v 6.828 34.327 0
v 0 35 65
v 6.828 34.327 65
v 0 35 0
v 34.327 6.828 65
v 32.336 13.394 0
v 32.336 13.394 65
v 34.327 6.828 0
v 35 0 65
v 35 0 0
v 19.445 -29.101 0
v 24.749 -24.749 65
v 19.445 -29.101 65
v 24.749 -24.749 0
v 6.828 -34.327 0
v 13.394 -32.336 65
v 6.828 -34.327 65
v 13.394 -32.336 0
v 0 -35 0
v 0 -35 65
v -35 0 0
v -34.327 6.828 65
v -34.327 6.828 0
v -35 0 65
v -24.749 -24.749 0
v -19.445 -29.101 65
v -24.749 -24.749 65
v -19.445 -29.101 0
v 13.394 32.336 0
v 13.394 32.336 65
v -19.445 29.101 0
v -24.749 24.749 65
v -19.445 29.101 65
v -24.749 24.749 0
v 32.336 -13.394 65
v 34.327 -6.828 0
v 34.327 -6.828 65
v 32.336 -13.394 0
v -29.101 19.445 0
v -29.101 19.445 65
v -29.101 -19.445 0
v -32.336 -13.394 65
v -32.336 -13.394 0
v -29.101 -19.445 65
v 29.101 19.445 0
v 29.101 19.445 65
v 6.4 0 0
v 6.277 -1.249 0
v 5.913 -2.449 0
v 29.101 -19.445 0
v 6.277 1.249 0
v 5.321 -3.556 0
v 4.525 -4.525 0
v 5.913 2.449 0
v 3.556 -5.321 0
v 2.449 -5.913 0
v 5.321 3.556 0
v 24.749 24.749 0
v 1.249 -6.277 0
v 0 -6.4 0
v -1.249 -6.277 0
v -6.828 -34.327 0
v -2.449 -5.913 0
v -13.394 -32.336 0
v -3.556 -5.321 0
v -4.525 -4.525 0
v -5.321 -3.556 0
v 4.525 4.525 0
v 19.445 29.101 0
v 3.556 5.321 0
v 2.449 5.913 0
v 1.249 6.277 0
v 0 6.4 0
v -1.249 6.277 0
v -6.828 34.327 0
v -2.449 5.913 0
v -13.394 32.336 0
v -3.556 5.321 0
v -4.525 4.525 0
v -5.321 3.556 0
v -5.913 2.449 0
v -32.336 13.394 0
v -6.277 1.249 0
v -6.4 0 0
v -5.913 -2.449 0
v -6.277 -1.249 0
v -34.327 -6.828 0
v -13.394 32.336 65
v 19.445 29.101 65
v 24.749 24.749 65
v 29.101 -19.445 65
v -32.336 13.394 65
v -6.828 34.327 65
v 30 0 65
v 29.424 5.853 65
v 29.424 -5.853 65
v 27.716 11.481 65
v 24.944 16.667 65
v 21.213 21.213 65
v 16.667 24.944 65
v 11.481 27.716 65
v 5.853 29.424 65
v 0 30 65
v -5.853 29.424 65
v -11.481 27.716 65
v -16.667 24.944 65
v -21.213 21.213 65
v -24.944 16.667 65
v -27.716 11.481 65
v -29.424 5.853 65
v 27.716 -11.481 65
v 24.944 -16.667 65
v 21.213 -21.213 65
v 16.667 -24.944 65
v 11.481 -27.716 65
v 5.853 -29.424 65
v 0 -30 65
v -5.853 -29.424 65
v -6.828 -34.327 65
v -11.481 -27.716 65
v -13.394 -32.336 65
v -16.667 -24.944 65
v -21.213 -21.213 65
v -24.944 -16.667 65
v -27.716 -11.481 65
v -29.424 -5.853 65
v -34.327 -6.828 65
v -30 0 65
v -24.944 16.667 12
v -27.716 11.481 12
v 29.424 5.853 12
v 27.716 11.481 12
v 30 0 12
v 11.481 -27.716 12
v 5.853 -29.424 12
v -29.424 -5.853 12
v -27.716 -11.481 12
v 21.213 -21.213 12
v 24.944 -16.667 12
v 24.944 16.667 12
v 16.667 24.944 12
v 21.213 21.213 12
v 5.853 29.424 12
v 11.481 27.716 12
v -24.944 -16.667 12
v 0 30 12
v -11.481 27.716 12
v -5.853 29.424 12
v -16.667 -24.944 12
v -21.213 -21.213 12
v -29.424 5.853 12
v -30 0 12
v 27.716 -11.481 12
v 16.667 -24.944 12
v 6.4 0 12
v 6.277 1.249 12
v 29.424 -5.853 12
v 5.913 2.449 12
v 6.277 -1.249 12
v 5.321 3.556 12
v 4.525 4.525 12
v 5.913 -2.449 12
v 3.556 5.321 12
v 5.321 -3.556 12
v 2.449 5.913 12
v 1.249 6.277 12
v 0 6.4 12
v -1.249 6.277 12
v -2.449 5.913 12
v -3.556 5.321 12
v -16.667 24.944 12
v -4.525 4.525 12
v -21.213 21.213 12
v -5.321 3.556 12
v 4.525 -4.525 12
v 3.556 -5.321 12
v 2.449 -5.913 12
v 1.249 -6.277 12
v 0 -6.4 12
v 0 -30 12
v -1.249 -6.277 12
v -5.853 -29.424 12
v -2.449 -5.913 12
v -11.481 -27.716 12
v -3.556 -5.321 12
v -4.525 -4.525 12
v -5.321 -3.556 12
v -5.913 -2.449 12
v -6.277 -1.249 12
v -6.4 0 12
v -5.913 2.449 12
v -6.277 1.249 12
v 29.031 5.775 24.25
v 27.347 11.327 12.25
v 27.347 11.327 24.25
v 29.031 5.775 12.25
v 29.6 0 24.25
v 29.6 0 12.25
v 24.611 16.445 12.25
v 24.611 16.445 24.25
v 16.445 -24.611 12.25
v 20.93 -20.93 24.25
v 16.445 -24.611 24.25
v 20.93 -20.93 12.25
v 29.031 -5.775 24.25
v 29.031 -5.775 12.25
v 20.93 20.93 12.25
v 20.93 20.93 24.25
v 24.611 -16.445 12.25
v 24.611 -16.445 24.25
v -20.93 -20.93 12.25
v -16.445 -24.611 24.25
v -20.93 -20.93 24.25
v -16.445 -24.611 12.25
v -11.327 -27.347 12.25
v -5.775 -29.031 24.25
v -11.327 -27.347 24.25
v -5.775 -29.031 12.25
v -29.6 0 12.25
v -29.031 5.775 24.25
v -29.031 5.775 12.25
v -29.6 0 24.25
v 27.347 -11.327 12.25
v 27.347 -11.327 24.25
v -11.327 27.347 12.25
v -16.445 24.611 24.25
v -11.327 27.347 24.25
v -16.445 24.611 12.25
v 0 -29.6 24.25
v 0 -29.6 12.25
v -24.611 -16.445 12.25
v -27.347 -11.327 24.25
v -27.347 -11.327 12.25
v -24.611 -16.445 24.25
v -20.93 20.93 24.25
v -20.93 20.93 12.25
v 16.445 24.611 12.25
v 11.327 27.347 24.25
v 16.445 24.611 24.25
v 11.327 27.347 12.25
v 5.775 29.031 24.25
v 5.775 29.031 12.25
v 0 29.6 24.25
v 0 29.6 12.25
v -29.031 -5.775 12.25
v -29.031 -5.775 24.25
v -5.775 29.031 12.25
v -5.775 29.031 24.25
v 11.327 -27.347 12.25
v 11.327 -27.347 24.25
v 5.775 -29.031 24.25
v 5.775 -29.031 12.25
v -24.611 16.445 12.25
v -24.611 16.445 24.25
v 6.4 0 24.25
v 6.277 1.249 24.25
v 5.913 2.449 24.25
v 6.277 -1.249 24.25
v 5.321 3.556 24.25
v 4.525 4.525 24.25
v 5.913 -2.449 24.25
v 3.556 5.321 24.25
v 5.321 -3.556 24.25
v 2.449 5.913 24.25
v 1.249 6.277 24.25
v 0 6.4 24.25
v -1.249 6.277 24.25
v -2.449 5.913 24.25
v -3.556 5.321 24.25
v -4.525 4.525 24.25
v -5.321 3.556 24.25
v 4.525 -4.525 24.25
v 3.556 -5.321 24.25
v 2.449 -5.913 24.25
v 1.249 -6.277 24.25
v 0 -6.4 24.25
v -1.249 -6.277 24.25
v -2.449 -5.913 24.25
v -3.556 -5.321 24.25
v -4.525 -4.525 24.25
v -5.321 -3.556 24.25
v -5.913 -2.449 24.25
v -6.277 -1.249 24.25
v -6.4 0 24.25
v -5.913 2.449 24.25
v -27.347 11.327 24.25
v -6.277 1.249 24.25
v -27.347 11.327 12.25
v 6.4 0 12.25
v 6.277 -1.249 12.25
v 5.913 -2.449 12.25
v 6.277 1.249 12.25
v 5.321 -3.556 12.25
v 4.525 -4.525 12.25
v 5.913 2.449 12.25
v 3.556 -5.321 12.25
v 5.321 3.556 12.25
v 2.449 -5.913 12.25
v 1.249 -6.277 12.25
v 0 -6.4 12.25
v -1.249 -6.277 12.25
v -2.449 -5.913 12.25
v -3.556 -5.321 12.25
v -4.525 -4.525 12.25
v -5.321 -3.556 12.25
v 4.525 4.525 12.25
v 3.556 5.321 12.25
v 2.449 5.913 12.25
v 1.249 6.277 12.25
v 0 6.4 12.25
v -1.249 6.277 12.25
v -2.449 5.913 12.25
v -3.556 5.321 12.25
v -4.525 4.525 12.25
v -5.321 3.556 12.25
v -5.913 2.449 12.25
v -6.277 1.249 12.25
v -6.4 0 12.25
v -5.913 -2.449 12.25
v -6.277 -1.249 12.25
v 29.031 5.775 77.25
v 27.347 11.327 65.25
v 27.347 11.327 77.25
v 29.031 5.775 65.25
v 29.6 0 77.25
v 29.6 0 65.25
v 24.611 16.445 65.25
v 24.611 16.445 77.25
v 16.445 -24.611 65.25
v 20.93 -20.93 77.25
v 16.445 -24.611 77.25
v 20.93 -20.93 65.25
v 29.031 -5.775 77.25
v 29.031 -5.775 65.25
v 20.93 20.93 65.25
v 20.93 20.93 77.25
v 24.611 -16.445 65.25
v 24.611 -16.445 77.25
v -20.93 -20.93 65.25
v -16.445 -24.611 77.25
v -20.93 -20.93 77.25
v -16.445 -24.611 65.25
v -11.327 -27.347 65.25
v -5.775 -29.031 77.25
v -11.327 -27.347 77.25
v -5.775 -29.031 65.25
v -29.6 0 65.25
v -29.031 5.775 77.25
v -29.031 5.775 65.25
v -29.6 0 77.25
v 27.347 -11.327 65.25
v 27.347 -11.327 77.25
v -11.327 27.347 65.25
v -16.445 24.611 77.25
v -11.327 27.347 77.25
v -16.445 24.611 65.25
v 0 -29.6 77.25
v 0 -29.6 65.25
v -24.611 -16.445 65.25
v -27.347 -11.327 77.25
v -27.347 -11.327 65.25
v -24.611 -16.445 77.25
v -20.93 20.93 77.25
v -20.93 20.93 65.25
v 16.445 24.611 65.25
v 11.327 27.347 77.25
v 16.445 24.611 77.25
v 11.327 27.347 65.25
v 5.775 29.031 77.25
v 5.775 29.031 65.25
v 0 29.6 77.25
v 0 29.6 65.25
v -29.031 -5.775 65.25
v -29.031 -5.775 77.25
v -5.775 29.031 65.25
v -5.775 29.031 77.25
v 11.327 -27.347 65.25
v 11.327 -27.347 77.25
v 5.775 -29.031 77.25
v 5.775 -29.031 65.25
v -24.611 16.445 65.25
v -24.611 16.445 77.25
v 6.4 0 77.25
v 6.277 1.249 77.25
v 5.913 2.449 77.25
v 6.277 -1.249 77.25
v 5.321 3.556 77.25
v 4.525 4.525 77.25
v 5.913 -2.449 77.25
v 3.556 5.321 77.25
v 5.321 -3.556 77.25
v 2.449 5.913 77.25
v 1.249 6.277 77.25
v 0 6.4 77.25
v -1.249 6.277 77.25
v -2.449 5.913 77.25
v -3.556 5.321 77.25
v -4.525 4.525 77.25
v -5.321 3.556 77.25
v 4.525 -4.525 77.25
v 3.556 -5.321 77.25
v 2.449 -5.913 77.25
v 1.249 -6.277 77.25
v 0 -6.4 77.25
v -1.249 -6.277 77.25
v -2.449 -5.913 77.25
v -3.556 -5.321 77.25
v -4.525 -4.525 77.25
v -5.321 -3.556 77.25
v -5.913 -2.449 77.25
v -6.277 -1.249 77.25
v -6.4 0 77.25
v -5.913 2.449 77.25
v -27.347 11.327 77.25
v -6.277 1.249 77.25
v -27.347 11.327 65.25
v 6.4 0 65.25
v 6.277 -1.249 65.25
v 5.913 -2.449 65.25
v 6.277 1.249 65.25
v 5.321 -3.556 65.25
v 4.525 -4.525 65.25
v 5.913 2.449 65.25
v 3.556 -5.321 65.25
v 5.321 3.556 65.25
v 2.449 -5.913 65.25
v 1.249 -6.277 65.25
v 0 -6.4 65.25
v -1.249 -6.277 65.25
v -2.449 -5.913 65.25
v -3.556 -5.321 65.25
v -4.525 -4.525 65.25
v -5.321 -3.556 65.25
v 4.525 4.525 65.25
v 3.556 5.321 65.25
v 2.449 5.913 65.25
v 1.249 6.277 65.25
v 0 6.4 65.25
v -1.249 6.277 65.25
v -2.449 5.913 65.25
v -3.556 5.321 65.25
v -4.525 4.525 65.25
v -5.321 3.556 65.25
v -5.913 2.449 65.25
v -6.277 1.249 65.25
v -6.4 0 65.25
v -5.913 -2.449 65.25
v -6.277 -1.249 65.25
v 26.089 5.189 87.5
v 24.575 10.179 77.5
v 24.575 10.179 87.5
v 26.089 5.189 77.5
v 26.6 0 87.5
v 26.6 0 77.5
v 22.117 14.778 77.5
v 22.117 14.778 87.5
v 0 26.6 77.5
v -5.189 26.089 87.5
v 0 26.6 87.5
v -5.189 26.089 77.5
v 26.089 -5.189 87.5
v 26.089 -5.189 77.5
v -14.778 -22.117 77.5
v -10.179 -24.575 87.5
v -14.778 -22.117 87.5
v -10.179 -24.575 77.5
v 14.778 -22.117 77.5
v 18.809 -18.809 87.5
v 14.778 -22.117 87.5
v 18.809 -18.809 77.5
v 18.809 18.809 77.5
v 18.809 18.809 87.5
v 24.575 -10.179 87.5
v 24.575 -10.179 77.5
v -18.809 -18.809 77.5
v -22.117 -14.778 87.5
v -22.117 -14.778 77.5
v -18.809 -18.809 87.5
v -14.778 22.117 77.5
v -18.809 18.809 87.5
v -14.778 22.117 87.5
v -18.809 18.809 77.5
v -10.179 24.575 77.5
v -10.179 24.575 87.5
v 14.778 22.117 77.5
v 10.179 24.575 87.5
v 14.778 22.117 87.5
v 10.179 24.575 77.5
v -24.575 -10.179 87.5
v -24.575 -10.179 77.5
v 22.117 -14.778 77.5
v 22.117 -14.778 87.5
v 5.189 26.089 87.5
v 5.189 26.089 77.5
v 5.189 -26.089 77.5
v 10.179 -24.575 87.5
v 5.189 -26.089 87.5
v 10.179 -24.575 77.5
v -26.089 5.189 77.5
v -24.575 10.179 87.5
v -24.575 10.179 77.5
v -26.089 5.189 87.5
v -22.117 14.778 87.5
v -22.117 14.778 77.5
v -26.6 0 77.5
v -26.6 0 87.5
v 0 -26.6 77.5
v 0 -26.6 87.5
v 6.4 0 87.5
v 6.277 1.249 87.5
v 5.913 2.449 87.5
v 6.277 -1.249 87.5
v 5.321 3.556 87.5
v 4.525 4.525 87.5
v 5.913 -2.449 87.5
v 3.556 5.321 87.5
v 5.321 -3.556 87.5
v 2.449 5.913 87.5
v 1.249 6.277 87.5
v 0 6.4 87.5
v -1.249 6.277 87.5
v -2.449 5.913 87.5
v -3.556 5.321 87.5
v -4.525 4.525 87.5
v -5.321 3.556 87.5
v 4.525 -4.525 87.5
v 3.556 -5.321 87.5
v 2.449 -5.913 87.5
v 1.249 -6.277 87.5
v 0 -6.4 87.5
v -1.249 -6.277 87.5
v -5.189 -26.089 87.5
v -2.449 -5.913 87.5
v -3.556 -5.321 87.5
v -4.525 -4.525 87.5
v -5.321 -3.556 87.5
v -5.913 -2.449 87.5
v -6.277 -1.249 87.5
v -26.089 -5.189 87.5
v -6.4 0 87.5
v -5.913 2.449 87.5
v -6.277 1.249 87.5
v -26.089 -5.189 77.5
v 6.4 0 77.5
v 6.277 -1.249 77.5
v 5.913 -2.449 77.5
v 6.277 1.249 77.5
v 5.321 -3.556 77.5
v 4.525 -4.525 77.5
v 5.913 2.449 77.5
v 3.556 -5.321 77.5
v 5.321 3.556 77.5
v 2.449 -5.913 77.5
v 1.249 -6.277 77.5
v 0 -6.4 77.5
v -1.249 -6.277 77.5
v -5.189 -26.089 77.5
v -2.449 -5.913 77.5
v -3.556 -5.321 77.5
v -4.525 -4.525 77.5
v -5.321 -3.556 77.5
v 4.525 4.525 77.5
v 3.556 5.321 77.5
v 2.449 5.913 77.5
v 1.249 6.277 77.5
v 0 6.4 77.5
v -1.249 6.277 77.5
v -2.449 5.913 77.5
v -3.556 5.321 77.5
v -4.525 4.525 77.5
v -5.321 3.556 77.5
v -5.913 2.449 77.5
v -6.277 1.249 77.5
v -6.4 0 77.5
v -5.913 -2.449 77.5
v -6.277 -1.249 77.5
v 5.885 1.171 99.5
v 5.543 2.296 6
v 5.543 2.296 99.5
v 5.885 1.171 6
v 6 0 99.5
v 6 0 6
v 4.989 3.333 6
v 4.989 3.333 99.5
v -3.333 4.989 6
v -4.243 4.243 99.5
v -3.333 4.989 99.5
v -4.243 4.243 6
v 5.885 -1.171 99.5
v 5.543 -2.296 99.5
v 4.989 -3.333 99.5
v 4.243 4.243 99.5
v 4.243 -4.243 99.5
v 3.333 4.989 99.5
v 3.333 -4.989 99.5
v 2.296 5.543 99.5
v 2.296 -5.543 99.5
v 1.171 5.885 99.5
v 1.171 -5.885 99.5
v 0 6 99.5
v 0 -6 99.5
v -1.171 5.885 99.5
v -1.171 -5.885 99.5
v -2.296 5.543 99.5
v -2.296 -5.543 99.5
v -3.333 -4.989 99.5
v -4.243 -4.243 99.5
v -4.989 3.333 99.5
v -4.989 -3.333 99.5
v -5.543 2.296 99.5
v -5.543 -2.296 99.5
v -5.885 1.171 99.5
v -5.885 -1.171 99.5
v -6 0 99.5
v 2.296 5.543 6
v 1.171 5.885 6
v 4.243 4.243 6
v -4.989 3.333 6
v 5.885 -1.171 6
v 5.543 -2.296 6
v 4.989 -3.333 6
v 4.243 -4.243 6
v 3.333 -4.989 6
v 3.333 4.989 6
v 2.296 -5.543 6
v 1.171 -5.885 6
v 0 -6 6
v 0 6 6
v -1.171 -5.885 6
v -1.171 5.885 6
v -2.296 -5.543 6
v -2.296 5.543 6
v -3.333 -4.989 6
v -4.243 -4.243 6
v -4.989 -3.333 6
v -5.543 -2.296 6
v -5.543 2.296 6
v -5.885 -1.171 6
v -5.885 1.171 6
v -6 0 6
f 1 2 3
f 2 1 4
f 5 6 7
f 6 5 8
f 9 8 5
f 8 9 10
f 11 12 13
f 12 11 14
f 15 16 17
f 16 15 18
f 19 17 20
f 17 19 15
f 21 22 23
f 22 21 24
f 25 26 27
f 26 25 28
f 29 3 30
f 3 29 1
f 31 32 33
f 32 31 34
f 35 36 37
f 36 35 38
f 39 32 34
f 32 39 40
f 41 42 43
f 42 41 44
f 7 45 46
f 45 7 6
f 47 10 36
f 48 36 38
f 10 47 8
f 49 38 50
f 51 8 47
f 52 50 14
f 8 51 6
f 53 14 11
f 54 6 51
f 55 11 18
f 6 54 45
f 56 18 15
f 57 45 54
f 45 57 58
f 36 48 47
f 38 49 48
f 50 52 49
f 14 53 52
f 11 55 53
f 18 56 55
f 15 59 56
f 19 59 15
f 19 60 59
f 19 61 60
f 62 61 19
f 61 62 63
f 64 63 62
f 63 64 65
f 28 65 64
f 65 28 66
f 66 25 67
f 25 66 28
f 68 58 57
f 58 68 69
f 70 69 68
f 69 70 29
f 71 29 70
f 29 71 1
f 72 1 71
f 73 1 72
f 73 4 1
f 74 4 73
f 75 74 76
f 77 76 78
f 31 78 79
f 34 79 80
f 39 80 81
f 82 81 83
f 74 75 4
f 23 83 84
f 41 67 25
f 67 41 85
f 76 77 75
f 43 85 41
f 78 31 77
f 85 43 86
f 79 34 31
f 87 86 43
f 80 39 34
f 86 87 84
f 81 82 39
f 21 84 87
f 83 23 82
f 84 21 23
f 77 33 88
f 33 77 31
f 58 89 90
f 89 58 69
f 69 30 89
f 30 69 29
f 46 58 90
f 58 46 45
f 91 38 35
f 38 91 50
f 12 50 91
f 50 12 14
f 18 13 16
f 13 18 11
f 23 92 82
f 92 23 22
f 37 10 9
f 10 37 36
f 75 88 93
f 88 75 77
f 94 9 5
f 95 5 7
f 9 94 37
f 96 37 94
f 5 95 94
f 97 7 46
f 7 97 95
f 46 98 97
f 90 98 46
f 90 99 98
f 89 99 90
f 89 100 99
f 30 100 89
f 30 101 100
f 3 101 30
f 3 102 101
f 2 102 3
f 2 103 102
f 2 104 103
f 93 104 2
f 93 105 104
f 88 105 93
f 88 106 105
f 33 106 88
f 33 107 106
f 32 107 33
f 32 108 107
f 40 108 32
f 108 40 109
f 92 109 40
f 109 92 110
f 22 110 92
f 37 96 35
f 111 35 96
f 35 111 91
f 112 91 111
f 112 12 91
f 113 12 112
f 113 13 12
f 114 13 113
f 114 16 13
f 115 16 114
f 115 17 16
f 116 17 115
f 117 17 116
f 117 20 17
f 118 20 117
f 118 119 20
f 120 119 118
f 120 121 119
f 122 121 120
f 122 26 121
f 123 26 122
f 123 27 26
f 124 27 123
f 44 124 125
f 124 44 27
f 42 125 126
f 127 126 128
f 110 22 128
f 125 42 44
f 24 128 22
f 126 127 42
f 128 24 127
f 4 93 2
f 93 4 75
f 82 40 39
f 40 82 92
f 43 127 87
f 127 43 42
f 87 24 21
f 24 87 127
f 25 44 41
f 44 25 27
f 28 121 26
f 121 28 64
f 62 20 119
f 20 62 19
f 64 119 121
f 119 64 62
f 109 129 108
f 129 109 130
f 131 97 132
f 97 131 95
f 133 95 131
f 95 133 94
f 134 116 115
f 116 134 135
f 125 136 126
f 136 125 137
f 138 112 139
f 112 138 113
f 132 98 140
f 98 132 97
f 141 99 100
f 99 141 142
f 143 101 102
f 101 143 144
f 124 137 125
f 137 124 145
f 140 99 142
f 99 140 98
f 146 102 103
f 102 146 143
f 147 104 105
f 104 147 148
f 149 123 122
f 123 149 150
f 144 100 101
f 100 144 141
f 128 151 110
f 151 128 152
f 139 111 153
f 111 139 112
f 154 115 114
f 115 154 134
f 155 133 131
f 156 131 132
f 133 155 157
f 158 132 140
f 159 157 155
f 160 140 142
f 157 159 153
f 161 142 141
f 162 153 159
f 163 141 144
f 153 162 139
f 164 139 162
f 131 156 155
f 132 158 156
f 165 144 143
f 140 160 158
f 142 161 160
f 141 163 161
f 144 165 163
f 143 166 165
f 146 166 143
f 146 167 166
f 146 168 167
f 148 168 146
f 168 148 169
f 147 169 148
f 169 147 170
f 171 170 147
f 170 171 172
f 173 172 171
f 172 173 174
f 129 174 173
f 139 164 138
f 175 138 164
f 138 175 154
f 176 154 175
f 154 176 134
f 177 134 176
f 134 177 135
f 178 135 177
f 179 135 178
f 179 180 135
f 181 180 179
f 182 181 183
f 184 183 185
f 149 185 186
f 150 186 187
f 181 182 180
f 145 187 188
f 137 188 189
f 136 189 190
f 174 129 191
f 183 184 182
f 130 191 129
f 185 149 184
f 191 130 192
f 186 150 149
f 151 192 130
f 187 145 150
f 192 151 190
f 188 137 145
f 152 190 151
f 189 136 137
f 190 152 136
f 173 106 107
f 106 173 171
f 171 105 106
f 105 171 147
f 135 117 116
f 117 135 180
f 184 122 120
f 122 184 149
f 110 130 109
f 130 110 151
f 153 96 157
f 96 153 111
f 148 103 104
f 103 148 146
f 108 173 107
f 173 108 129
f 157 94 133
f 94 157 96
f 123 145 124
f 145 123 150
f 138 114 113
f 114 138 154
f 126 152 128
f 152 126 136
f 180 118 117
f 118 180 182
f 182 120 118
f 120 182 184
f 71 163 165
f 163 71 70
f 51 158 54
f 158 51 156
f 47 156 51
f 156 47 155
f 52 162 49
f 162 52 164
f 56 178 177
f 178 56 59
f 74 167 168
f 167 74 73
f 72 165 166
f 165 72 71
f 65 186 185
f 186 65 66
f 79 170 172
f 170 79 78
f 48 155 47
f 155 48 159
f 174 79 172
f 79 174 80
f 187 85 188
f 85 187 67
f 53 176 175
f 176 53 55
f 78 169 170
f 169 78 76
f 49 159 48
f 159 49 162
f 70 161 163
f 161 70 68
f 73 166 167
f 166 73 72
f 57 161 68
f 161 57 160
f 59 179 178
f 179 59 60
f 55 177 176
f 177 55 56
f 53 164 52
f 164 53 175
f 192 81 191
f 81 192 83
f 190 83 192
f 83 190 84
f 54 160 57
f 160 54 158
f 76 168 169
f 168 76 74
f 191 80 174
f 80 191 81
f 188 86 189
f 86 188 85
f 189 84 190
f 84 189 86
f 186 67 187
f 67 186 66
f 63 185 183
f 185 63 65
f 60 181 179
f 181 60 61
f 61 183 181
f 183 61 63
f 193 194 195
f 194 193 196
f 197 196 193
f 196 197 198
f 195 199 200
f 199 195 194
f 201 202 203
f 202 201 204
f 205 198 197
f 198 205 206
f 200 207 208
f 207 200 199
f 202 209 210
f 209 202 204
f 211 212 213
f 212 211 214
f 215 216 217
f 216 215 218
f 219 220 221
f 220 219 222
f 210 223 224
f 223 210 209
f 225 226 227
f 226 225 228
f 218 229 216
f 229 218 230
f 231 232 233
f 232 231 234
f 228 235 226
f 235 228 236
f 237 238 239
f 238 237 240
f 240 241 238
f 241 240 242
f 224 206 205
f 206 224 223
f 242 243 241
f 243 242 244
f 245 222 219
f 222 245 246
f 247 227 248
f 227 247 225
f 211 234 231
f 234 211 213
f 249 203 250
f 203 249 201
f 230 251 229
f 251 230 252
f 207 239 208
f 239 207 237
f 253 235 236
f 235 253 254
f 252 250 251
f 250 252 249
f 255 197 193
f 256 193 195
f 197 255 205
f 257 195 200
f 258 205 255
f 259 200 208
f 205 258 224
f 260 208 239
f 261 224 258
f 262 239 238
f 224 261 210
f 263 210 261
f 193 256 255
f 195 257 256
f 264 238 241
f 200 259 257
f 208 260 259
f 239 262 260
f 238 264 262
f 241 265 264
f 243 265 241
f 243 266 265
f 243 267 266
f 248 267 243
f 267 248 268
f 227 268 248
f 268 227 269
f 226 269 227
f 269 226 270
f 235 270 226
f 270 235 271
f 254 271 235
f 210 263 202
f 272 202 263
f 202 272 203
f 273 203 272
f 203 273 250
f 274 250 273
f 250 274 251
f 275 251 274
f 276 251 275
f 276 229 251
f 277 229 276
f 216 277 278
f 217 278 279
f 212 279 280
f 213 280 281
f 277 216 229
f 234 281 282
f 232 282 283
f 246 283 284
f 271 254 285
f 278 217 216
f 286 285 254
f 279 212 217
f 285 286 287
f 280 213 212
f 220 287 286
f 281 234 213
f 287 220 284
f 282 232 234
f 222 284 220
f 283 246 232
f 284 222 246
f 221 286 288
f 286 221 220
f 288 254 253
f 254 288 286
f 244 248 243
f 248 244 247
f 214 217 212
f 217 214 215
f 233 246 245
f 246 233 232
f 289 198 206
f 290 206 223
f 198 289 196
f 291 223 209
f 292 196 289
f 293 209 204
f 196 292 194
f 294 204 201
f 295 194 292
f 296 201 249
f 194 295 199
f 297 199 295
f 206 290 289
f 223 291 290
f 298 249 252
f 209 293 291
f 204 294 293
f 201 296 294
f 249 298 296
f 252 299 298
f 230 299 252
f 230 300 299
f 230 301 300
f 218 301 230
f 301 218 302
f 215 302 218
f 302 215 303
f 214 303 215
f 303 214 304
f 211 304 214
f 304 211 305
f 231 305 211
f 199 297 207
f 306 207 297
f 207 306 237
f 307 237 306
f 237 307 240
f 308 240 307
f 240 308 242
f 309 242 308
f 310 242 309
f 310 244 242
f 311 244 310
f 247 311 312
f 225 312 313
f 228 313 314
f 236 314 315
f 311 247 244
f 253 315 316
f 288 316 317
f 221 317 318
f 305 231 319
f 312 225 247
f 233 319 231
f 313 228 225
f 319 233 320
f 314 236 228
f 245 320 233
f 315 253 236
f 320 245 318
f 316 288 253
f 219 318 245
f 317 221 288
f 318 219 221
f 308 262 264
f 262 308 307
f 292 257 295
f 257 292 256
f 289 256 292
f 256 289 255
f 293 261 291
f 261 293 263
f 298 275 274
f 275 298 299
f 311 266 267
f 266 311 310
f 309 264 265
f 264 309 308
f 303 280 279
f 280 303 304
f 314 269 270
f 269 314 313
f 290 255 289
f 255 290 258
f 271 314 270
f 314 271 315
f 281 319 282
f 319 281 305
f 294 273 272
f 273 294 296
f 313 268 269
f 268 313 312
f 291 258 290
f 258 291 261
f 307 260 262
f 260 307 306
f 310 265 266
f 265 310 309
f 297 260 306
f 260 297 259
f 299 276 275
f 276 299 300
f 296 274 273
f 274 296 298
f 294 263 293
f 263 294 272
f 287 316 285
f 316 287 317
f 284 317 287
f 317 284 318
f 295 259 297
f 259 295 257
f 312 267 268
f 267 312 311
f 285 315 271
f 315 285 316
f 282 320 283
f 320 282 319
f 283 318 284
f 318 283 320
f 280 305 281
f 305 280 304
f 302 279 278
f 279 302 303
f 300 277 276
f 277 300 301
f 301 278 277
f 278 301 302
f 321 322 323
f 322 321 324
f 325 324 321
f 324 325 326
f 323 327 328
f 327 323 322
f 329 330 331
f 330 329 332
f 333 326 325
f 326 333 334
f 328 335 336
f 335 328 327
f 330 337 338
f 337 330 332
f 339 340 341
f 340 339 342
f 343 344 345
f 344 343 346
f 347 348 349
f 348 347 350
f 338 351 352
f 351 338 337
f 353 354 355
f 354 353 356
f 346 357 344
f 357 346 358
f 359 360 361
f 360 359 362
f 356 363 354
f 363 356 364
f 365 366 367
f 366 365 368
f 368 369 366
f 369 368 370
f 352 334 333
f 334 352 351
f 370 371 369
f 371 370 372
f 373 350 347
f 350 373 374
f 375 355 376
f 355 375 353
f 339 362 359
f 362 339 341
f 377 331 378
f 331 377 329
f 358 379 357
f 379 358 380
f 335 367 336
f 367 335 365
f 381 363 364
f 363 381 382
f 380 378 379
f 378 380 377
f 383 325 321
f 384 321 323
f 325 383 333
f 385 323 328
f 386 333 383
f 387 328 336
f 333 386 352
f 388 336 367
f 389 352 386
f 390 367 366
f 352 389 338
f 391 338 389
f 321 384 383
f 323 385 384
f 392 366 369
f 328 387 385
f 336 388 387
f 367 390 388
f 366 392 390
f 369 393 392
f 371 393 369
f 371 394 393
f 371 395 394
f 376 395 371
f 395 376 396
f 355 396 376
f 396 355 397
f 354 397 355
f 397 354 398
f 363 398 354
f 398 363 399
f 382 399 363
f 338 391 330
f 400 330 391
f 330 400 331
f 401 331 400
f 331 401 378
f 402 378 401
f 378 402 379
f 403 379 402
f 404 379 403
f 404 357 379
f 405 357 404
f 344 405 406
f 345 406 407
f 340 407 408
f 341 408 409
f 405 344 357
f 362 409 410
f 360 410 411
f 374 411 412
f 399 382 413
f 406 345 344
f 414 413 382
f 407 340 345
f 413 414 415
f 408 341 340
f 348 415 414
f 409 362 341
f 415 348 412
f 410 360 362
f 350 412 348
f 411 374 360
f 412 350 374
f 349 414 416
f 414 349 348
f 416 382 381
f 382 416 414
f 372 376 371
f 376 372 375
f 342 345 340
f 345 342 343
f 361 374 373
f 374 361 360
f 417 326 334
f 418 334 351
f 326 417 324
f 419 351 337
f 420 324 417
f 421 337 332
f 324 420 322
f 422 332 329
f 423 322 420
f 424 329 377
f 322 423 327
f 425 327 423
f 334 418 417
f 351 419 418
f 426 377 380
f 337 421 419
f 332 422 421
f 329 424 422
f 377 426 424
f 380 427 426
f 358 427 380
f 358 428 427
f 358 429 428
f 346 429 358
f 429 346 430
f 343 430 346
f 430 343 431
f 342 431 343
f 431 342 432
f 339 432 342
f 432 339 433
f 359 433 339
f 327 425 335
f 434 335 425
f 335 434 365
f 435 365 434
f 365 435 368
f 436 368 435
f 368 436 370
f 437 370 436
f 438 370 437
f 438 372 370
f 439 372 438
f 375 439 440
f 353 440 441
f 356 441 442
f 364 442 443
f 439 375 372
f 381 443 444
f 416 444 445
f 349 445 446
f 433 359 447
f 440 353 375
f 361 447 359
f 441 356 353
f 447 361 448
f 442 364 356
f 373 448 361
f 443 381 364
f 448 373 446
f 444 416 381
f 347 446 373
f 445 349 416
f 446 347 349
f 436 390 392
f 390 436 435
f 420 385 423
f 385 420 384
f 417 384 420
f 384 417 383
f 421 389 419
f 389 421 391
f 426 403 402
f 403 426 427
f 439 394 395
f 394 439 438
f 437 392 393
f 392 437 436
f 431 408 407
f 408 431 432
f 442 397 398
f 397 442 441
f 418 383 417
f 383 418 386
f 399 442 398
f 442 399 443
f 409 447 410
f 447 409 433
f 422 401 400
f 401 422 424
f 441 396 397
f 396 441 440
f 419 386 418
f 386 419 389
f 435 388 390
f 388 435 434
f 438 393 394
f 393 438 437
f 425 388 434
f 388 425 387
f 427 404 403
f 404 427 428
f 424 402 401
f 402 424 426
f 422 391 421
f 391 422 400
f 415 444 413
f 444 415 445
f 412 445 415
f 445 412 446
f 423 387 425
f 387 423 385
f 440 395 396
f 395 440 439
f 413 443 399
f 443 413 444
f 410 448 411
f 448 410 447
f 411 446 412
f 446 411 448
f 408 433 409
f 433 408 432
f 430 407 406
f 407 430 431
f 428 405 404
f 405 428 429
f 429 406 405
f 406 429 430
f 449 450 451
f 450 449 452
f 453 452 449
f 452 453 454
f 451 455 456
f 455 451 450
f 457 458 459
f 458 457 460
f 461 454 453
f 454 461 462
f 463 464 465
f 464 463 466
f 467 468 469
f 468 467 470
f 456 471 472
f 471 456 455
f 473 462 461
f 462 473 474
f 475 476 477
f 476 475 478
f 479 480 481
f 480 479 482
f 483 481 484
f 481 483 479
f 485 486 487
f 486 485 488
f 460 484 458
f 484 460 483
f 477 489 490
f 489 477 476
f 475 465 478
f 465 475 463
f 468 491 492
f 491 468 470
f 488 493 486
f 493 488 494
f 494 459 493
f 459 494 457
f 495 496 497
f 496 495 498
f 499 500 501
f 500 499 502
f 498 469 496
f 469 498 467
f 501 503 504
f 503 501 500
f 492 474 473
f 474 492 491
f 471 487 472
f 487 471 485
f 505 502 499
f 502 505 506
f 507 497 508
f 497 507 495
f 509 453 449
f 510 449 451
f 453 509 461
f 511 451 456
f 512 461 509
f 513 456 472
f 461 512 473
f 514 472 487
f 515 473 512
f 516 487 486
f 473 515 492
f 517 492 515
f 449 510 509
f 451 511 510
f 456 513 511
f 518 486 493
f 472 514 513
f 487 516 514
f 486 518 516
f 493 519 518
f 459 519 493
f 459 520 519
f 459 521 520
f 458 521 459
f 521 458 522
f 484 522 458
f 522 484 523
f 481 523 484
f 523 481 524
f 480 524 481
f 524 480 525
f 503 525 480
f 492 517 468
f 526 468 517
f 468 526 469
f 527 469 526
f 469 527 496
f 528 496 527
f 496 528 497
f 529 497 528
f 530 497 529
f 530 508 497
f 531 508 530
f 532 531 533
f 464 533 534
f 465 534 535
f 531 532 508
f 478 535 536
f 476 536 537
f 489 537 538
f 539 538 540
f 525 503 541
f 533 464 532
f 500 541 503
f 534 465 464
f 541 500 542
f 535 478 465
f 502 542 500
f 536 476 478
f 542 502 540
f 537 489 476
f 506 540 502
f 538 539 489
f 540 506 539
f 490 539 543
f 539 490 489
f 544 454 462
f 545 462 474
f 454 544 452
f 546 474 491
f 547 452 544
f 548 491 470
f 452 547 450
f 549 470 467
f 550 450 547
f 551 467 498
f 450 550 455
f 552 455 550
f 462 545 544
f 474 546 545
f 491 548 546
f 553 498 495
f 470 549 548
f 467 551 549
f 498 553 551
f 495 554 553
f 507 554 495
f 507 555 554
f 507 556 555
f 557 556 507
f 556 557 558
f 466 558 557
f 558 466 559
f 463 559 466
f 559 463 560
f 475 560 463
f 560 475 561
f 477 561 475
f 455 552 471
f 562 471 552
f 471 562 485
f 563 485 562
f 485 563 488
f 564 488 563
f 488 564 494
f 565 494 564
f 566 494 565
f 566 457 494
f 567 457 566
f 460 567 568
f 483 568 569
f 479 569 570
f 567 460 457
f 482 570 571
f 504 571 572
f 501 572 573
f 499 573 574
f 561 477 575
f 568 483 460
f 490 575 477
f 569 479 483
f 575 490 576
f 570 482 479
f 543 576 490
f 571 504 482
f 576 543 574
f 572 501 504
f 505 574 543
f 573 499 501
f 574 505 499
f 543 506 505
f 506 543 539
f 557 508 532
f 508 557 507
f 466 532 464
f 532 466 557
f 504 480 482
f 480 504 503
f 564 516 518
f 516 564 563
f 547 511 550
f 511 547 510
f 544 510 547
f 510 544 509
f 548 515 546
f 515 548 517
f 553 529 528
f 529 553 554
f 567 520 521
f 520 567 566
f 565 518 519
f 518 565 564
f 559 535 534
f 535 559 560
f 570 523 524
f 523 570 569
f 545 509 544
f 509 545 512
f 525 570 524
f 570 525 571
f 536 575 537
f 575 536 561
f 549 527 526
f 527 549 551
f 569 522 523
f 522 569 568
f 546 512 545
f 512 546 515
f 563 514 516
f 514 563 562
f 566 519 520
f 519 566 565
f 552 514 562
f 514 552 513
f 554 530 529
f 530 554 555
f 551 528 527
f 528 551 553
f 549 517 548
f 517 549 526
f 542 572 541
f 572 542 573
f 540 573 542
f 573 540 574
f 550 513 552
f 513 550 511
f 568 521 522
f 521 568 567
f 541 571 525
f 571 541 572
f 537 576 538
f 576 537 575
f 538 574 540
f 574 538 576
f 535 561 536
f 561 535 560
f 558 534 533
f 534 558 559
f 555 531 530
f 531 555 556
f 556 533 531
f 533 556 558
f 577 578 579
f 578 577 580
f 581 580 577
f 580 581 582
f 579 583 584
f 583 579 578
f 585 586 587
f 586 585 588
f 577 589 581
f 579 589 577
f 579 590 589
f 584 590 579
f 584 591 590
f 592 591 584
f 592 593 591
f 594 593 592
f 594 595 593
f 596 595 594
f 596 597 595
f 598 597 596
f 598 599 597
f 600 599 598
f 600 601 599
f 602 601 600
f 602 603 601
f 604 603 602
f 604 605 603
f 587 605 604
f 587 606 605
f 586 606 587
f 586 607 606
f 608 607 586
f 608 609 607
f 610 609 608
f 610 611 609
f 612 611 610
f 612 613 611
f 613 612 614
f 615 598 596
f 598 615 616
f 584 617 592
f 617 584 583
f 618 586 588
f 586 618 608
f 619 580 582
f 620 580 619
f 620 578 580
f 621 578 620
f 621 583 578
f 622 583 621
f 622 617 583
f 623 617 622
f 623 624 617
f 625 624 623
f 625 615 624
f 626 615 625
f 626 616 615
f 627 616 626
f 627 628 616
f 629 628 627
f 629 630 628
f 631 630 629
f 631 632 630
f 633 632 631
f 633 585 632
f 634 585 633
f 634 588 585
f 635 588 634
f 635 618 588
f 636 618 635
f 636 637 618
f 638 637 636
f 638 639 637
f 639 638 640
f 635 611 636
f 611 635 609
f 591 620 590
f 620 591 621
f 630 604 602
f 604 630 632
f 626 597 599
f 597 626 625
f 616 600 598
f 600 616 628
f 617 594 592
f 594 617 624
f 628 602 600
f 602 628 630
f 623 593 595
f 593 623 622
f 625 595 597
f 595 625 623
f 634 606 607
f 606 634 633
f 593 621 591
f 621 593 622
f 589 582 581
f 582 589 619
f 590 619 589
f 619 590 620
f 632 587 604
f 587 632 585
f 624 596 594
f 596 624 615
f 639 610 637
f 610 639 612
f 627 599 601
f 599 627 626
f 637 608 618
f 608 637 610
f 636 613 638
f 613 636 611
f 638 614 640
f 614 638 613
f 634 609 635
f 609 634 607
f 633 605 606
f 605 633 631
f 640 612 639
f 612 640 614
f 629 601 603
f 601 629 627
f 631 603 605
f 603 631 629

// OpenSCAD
$fn = 32;

// ------------------------------------------------------------------------
// Bearing housing: housing d70, two bearings and a shaft
// Every part is its own module, assembly() places them once.
// ------------------------------------------------------------------------

// --- part 1 ---
module housing() {
  difference() {
    cylinder(h = 65, d = 70);
    translate([0, 0, 12]) cylinder(h = 54, d = 60);
    translate([0, 0, -1]) cylinder(h = 14, d = 12.8);
  }
}

// --- part 2 ---
module bearing_lower() {
  difference() {
      translate([0, 0, 0]) cylinder(h = 12, d = 59.2);
      translate([0, 0, -1]) cylinder(h = 14, d = 12.8);
    }
}

// --- part 3 ---
module bearing_upper() {
  difference() {
      translate([0, 0, 0]) cylinder(h = 12, d = 59.2);
      translate([0, 0, -1]) cylinder(h = 14, d = 12.8);
    }
}

// --- part 4 ---
module spacer() {
  difference() {
      translate([0, 0, 0]) cylinder(h = 10, d = 53.2);
      translate([0, 0, -1]) cylinder(h = 12, d = 12.8);
    }
}

// --- part 5 ---
module shaft() {
  translate([0, 0, -46.75]) cylinder(h = 93.5, d = 12);
}

// --- assembly ---
module assembly() {
  translate([0, 0, 0]) rotate([0, 0, 0]) housing();
  translate([0, 0, 12.25]) rotate([0, 0, 0]) bearing_lower();
  translate([0, 0, 65.25]) rotate([0, 0, 0]) bearing_upper();
  translate([0, 0, 77.5]) rotate([0, 0, 0]) spacer();
  translate([0, 0, 52.75]) rotate([0, 0, 0]) shaft();
}

assembly();
